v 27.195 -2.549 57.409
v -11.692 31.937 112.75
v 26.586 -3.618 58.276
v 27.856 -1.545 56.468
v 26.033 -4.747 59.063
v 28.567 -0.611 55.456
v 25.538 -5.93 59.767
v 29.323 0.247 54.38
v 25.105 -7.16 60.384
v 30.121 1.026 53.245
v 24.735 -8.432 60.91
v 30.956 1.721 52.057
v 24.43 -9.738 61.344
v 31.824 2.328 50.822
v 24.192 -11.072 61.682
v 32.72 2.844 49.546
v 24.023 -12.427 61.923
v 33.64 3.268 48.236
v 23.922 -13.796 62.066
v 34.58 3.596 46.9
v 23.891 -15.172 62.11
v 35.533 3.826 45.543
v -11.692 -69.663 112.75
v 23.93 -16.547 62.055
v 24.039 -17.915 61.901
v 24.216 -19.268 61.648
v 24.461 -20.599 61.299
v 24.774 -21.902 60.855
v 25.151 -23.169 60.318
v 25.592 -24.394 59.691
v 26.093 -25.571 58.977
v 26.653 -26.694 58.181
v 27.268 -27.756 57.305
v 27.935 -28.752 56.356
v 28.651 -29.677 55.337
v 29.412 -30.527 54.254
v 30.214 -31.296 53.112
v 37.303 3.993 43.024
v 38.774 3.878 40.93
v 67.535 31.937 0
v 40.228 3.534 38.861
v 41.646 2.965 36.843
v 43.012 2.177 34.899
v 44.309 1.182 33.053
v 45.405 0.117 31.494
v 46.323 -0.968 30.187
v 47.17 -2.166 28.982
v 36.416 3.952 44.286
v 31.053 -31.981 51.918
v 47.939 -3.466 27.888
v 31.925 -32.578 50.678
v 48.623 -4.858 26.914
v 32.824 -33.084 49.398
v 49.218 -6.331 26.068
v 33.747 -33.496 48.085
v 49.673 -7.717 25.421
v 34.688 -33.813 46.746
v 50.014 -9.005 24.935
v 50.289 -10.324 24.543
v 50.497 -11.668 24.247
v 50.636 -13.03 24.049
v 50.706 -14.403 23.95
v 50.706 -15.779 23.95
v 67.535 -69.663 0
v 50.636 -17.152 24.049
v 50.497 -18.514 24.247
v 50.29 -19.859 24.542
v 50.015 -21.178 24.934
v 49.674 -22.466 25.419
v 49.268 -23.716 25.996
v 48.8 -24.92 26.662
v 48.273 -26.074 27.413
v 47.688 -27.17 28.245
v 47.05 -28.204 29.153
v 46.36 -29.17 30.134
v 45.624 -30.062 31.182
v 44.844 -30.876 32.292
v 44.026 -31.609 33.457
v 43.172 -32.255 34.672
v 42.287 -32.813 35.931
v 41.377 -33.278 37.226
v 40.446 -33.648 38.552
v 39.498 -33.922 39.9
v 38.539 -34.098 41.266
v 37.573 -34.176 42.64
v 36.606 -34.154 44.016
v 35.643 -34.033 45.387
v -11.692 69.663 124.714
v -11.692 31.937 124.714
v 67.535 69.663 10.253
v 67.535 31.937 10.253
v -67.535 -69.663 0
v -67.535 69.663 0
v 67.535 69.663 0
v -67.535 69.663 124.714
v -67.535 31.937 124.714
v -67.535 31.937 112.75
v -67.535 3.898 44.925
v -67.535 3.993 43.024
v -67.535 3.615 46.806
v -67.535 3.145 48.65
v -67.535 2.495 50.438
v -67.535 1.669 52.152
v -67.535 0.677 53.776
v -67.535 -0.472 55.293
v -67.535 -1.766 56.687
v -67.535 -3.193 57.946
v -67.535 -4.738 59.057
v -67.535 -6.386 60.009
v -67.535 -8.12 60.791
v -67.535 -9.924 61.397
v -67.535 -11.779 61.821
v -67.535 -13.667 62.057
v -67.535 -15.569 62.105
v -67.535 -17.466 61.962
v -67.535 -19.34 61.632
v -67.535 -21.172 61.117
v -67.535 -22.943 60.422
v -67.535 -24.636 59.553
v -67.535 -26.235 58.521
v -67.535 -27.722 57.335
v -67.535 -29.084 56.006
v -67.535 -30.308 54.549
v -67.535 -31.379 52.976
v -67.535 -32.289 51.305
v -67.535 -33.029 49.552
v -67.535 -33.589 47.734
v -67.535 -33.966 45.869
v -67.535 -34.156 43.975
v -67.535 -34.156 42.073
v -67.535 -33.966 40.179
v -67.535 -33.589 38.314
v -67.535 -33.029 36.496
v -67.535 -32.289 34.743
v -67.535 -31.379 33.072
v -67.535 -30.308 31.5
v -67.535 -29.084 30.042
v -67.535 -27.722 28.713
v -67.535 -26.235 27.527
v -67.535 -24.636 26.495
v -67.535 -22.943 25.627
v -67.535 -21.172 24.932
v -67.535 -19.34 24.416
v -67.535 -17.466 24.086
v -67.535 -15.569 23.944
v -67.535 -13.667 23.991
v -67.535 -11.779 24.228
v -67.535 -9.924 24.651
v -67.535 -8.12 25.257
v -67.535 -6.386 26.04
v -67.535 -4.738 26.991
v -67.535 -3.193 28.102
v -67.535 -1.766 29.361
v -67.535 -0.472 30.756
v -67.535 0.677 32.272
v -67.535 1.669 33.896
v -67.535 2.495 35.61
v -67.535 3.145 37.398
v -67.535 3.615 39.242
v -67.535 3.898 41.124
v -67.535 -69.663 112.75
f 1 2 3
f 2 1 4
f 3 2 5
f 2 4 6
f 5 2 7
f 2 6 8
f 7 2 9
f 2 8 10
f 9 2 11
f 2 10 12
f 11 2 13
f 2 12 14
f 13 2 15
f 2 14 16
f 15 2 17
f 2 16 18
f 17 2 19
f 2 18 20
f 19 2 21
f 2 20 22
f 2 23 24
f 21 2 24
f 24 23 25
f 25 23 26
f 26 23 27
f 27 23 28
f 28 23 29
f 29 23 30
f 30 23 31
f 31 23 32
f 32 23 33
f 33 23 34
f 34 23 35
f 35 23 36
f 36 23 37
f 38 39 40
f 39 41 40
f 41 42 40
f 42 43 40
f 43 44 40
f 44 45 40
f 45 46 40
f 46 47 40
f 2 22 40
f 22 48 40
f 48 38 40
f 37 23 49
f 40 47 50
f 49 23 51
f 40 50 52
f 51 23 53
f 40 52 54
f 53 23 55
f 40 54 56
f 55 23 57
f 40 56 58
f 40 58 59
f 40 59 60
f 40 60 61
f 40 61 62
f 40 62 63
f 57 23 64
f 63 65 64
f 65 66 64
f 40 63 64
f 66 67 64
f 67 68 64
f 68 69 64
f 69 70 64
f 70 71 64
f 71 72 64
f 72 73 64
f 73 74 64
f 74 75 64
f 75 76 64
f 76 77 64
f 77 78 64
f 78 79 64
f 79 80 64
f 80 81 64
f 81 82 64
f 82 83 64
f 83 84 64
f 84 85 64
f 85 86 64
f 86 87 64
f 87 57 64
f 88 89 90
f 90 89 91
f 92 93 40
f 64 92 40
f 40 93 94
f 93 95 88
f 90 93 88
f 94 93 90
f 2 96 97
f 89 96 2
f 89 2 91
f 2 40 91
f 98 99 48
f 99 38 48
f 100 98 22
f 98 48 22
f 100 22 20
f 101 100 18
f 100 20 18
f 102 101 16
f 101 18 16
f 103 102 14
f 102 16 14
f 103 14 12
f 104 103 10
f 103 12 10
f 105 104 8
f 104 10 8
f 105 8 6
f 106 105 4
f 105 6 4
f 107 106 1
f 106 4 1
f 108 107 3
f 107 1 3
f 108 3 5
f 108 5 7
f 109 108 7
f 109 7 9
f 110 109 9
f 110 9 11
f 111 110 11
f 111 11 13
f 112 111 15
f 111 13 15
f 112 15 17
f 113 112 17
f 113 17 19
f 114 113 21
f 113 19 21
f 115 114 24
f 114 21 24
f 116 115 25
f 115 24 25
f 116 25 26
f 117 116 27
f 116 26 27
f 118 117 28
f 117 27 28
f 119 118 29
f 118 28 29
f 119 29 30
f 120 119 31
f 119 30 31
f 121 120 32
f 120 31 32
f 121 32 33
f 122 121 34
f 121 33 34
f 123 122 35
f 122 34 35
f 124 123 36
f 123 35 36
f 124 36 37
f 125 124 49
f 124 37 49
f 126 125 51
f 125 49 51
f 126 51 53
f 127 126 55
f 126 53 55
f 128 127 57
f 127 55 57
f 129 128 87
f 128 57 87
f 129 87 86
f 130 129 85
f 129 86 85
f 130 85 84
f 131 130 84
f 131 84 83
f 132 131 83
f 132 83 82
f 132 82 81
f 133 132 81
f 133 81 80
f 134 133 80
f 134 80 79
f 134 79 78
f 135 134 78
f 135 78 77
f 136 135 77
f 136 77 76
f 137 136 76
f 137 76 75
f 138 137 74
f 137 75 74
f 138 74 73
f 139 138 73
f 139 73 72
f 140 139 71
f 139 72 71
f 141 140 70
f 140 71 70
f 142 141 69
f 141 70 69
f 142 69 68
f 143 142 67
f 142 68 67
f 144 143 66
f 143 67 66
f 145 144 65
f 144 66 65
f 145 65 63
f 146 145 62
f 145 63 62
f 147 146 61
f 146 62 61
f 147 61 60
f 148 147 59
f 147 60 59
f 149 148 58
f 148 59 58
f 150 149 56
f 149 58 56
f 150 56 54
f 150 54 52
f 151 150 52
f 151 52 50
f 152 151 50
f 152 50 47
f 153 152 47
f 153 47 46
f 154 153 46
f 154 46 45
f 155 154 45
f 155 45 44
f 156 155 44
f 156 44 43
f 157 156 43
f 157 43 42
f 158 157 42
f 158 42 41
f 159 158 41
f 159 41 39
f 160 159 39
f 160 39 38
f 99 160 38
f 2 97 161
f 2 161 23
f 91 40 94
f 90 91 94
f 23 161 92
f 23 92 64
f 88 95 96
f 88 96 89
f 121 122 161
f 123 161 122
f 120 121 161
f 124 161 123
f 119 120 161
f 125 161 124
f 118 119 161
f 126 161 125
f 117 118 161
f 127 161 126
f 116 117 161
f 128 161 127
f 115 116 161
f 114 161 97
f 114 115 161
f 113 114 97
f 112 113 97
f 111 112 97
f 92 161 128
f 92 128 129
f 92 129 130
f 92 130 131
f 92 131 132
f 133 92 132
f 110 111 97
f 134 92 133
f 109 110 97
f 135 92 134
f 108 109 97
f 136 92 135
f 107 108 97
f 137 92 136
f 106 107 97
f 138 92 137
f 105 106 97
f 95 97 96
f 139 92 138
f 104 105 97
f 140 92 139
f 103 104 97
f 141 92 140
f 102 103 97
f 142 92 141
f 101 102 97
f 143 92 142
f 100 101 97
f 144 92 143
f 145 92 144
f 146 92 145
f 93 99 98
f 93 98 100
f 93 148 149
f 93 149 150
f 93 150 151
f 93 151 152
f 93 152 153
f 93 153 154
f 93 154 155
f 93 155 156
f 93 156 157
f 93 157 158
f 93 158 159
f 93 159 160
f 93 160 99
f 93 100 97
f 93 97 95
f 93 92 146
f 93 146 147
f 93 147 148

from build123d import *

# Parameters (mm, degrees)
F0_W     = 135.070444
F0_H     = 139.326424
F1_DEPTH = 124.714
F3_DEPTH = 101.6
F5_DEPTH = 101.6
F7_DEPTH = 50.8
F8_R     = 19.086434
F9_DEPTH = 138.176


with BuildPart() as f1:
    # F0 (on Top) → F1 (new body)
    with BuildSketch(Plane.XY):
        Rectangle(F0_W, F0_H)
    extrude(amount=F1_DEPTH)

    # F2 (on face) → F3 (cut, symmetric)
    with BuildSketch(Plane.XZ.offset(69.663212)):
        Polygon((67.535222, 124.714), (-20.09901, 124.714), (67.535222, 0), align=None)
    extrude(amount=F3_DEPTH, both=True, mode=Mode.SUBTRACT)

    # F4 (on face) → F5 (cut)
    with BuildSketch(Plane.XZ.offset(69.663212)):
        Polygon((-67.535222, 112.750193), (-11.692263, 112.750193), (-20.09901, 124.714), (-67.535222, 124.714), align=None)
    extrude(amount=-F5_DEPTH, mode=Mode.SUBTRACT)

    # F6 (on face) → F7 (cut)
    with BuildSketch(Plane.XZ.offset(-31.936788)):
        Polygon((67.535222, 124.714), (-11.692263, 124.714), (67.535222, 10.252971), align=None)
    extrude(amount=-F7_DEPTH, mode=Mode.SUBTRACT)

    # F8 (on Right) → F9 (cut, symmetric)
    with BuildSketch(Plane.YZ):
        with Locations((-15.093137, 43.024112)):
            Circle(F8_R)
    extrude(amount=F9_DEPTH, both=True, mode=Mode.SUBTRACT)


solid = f1.part
